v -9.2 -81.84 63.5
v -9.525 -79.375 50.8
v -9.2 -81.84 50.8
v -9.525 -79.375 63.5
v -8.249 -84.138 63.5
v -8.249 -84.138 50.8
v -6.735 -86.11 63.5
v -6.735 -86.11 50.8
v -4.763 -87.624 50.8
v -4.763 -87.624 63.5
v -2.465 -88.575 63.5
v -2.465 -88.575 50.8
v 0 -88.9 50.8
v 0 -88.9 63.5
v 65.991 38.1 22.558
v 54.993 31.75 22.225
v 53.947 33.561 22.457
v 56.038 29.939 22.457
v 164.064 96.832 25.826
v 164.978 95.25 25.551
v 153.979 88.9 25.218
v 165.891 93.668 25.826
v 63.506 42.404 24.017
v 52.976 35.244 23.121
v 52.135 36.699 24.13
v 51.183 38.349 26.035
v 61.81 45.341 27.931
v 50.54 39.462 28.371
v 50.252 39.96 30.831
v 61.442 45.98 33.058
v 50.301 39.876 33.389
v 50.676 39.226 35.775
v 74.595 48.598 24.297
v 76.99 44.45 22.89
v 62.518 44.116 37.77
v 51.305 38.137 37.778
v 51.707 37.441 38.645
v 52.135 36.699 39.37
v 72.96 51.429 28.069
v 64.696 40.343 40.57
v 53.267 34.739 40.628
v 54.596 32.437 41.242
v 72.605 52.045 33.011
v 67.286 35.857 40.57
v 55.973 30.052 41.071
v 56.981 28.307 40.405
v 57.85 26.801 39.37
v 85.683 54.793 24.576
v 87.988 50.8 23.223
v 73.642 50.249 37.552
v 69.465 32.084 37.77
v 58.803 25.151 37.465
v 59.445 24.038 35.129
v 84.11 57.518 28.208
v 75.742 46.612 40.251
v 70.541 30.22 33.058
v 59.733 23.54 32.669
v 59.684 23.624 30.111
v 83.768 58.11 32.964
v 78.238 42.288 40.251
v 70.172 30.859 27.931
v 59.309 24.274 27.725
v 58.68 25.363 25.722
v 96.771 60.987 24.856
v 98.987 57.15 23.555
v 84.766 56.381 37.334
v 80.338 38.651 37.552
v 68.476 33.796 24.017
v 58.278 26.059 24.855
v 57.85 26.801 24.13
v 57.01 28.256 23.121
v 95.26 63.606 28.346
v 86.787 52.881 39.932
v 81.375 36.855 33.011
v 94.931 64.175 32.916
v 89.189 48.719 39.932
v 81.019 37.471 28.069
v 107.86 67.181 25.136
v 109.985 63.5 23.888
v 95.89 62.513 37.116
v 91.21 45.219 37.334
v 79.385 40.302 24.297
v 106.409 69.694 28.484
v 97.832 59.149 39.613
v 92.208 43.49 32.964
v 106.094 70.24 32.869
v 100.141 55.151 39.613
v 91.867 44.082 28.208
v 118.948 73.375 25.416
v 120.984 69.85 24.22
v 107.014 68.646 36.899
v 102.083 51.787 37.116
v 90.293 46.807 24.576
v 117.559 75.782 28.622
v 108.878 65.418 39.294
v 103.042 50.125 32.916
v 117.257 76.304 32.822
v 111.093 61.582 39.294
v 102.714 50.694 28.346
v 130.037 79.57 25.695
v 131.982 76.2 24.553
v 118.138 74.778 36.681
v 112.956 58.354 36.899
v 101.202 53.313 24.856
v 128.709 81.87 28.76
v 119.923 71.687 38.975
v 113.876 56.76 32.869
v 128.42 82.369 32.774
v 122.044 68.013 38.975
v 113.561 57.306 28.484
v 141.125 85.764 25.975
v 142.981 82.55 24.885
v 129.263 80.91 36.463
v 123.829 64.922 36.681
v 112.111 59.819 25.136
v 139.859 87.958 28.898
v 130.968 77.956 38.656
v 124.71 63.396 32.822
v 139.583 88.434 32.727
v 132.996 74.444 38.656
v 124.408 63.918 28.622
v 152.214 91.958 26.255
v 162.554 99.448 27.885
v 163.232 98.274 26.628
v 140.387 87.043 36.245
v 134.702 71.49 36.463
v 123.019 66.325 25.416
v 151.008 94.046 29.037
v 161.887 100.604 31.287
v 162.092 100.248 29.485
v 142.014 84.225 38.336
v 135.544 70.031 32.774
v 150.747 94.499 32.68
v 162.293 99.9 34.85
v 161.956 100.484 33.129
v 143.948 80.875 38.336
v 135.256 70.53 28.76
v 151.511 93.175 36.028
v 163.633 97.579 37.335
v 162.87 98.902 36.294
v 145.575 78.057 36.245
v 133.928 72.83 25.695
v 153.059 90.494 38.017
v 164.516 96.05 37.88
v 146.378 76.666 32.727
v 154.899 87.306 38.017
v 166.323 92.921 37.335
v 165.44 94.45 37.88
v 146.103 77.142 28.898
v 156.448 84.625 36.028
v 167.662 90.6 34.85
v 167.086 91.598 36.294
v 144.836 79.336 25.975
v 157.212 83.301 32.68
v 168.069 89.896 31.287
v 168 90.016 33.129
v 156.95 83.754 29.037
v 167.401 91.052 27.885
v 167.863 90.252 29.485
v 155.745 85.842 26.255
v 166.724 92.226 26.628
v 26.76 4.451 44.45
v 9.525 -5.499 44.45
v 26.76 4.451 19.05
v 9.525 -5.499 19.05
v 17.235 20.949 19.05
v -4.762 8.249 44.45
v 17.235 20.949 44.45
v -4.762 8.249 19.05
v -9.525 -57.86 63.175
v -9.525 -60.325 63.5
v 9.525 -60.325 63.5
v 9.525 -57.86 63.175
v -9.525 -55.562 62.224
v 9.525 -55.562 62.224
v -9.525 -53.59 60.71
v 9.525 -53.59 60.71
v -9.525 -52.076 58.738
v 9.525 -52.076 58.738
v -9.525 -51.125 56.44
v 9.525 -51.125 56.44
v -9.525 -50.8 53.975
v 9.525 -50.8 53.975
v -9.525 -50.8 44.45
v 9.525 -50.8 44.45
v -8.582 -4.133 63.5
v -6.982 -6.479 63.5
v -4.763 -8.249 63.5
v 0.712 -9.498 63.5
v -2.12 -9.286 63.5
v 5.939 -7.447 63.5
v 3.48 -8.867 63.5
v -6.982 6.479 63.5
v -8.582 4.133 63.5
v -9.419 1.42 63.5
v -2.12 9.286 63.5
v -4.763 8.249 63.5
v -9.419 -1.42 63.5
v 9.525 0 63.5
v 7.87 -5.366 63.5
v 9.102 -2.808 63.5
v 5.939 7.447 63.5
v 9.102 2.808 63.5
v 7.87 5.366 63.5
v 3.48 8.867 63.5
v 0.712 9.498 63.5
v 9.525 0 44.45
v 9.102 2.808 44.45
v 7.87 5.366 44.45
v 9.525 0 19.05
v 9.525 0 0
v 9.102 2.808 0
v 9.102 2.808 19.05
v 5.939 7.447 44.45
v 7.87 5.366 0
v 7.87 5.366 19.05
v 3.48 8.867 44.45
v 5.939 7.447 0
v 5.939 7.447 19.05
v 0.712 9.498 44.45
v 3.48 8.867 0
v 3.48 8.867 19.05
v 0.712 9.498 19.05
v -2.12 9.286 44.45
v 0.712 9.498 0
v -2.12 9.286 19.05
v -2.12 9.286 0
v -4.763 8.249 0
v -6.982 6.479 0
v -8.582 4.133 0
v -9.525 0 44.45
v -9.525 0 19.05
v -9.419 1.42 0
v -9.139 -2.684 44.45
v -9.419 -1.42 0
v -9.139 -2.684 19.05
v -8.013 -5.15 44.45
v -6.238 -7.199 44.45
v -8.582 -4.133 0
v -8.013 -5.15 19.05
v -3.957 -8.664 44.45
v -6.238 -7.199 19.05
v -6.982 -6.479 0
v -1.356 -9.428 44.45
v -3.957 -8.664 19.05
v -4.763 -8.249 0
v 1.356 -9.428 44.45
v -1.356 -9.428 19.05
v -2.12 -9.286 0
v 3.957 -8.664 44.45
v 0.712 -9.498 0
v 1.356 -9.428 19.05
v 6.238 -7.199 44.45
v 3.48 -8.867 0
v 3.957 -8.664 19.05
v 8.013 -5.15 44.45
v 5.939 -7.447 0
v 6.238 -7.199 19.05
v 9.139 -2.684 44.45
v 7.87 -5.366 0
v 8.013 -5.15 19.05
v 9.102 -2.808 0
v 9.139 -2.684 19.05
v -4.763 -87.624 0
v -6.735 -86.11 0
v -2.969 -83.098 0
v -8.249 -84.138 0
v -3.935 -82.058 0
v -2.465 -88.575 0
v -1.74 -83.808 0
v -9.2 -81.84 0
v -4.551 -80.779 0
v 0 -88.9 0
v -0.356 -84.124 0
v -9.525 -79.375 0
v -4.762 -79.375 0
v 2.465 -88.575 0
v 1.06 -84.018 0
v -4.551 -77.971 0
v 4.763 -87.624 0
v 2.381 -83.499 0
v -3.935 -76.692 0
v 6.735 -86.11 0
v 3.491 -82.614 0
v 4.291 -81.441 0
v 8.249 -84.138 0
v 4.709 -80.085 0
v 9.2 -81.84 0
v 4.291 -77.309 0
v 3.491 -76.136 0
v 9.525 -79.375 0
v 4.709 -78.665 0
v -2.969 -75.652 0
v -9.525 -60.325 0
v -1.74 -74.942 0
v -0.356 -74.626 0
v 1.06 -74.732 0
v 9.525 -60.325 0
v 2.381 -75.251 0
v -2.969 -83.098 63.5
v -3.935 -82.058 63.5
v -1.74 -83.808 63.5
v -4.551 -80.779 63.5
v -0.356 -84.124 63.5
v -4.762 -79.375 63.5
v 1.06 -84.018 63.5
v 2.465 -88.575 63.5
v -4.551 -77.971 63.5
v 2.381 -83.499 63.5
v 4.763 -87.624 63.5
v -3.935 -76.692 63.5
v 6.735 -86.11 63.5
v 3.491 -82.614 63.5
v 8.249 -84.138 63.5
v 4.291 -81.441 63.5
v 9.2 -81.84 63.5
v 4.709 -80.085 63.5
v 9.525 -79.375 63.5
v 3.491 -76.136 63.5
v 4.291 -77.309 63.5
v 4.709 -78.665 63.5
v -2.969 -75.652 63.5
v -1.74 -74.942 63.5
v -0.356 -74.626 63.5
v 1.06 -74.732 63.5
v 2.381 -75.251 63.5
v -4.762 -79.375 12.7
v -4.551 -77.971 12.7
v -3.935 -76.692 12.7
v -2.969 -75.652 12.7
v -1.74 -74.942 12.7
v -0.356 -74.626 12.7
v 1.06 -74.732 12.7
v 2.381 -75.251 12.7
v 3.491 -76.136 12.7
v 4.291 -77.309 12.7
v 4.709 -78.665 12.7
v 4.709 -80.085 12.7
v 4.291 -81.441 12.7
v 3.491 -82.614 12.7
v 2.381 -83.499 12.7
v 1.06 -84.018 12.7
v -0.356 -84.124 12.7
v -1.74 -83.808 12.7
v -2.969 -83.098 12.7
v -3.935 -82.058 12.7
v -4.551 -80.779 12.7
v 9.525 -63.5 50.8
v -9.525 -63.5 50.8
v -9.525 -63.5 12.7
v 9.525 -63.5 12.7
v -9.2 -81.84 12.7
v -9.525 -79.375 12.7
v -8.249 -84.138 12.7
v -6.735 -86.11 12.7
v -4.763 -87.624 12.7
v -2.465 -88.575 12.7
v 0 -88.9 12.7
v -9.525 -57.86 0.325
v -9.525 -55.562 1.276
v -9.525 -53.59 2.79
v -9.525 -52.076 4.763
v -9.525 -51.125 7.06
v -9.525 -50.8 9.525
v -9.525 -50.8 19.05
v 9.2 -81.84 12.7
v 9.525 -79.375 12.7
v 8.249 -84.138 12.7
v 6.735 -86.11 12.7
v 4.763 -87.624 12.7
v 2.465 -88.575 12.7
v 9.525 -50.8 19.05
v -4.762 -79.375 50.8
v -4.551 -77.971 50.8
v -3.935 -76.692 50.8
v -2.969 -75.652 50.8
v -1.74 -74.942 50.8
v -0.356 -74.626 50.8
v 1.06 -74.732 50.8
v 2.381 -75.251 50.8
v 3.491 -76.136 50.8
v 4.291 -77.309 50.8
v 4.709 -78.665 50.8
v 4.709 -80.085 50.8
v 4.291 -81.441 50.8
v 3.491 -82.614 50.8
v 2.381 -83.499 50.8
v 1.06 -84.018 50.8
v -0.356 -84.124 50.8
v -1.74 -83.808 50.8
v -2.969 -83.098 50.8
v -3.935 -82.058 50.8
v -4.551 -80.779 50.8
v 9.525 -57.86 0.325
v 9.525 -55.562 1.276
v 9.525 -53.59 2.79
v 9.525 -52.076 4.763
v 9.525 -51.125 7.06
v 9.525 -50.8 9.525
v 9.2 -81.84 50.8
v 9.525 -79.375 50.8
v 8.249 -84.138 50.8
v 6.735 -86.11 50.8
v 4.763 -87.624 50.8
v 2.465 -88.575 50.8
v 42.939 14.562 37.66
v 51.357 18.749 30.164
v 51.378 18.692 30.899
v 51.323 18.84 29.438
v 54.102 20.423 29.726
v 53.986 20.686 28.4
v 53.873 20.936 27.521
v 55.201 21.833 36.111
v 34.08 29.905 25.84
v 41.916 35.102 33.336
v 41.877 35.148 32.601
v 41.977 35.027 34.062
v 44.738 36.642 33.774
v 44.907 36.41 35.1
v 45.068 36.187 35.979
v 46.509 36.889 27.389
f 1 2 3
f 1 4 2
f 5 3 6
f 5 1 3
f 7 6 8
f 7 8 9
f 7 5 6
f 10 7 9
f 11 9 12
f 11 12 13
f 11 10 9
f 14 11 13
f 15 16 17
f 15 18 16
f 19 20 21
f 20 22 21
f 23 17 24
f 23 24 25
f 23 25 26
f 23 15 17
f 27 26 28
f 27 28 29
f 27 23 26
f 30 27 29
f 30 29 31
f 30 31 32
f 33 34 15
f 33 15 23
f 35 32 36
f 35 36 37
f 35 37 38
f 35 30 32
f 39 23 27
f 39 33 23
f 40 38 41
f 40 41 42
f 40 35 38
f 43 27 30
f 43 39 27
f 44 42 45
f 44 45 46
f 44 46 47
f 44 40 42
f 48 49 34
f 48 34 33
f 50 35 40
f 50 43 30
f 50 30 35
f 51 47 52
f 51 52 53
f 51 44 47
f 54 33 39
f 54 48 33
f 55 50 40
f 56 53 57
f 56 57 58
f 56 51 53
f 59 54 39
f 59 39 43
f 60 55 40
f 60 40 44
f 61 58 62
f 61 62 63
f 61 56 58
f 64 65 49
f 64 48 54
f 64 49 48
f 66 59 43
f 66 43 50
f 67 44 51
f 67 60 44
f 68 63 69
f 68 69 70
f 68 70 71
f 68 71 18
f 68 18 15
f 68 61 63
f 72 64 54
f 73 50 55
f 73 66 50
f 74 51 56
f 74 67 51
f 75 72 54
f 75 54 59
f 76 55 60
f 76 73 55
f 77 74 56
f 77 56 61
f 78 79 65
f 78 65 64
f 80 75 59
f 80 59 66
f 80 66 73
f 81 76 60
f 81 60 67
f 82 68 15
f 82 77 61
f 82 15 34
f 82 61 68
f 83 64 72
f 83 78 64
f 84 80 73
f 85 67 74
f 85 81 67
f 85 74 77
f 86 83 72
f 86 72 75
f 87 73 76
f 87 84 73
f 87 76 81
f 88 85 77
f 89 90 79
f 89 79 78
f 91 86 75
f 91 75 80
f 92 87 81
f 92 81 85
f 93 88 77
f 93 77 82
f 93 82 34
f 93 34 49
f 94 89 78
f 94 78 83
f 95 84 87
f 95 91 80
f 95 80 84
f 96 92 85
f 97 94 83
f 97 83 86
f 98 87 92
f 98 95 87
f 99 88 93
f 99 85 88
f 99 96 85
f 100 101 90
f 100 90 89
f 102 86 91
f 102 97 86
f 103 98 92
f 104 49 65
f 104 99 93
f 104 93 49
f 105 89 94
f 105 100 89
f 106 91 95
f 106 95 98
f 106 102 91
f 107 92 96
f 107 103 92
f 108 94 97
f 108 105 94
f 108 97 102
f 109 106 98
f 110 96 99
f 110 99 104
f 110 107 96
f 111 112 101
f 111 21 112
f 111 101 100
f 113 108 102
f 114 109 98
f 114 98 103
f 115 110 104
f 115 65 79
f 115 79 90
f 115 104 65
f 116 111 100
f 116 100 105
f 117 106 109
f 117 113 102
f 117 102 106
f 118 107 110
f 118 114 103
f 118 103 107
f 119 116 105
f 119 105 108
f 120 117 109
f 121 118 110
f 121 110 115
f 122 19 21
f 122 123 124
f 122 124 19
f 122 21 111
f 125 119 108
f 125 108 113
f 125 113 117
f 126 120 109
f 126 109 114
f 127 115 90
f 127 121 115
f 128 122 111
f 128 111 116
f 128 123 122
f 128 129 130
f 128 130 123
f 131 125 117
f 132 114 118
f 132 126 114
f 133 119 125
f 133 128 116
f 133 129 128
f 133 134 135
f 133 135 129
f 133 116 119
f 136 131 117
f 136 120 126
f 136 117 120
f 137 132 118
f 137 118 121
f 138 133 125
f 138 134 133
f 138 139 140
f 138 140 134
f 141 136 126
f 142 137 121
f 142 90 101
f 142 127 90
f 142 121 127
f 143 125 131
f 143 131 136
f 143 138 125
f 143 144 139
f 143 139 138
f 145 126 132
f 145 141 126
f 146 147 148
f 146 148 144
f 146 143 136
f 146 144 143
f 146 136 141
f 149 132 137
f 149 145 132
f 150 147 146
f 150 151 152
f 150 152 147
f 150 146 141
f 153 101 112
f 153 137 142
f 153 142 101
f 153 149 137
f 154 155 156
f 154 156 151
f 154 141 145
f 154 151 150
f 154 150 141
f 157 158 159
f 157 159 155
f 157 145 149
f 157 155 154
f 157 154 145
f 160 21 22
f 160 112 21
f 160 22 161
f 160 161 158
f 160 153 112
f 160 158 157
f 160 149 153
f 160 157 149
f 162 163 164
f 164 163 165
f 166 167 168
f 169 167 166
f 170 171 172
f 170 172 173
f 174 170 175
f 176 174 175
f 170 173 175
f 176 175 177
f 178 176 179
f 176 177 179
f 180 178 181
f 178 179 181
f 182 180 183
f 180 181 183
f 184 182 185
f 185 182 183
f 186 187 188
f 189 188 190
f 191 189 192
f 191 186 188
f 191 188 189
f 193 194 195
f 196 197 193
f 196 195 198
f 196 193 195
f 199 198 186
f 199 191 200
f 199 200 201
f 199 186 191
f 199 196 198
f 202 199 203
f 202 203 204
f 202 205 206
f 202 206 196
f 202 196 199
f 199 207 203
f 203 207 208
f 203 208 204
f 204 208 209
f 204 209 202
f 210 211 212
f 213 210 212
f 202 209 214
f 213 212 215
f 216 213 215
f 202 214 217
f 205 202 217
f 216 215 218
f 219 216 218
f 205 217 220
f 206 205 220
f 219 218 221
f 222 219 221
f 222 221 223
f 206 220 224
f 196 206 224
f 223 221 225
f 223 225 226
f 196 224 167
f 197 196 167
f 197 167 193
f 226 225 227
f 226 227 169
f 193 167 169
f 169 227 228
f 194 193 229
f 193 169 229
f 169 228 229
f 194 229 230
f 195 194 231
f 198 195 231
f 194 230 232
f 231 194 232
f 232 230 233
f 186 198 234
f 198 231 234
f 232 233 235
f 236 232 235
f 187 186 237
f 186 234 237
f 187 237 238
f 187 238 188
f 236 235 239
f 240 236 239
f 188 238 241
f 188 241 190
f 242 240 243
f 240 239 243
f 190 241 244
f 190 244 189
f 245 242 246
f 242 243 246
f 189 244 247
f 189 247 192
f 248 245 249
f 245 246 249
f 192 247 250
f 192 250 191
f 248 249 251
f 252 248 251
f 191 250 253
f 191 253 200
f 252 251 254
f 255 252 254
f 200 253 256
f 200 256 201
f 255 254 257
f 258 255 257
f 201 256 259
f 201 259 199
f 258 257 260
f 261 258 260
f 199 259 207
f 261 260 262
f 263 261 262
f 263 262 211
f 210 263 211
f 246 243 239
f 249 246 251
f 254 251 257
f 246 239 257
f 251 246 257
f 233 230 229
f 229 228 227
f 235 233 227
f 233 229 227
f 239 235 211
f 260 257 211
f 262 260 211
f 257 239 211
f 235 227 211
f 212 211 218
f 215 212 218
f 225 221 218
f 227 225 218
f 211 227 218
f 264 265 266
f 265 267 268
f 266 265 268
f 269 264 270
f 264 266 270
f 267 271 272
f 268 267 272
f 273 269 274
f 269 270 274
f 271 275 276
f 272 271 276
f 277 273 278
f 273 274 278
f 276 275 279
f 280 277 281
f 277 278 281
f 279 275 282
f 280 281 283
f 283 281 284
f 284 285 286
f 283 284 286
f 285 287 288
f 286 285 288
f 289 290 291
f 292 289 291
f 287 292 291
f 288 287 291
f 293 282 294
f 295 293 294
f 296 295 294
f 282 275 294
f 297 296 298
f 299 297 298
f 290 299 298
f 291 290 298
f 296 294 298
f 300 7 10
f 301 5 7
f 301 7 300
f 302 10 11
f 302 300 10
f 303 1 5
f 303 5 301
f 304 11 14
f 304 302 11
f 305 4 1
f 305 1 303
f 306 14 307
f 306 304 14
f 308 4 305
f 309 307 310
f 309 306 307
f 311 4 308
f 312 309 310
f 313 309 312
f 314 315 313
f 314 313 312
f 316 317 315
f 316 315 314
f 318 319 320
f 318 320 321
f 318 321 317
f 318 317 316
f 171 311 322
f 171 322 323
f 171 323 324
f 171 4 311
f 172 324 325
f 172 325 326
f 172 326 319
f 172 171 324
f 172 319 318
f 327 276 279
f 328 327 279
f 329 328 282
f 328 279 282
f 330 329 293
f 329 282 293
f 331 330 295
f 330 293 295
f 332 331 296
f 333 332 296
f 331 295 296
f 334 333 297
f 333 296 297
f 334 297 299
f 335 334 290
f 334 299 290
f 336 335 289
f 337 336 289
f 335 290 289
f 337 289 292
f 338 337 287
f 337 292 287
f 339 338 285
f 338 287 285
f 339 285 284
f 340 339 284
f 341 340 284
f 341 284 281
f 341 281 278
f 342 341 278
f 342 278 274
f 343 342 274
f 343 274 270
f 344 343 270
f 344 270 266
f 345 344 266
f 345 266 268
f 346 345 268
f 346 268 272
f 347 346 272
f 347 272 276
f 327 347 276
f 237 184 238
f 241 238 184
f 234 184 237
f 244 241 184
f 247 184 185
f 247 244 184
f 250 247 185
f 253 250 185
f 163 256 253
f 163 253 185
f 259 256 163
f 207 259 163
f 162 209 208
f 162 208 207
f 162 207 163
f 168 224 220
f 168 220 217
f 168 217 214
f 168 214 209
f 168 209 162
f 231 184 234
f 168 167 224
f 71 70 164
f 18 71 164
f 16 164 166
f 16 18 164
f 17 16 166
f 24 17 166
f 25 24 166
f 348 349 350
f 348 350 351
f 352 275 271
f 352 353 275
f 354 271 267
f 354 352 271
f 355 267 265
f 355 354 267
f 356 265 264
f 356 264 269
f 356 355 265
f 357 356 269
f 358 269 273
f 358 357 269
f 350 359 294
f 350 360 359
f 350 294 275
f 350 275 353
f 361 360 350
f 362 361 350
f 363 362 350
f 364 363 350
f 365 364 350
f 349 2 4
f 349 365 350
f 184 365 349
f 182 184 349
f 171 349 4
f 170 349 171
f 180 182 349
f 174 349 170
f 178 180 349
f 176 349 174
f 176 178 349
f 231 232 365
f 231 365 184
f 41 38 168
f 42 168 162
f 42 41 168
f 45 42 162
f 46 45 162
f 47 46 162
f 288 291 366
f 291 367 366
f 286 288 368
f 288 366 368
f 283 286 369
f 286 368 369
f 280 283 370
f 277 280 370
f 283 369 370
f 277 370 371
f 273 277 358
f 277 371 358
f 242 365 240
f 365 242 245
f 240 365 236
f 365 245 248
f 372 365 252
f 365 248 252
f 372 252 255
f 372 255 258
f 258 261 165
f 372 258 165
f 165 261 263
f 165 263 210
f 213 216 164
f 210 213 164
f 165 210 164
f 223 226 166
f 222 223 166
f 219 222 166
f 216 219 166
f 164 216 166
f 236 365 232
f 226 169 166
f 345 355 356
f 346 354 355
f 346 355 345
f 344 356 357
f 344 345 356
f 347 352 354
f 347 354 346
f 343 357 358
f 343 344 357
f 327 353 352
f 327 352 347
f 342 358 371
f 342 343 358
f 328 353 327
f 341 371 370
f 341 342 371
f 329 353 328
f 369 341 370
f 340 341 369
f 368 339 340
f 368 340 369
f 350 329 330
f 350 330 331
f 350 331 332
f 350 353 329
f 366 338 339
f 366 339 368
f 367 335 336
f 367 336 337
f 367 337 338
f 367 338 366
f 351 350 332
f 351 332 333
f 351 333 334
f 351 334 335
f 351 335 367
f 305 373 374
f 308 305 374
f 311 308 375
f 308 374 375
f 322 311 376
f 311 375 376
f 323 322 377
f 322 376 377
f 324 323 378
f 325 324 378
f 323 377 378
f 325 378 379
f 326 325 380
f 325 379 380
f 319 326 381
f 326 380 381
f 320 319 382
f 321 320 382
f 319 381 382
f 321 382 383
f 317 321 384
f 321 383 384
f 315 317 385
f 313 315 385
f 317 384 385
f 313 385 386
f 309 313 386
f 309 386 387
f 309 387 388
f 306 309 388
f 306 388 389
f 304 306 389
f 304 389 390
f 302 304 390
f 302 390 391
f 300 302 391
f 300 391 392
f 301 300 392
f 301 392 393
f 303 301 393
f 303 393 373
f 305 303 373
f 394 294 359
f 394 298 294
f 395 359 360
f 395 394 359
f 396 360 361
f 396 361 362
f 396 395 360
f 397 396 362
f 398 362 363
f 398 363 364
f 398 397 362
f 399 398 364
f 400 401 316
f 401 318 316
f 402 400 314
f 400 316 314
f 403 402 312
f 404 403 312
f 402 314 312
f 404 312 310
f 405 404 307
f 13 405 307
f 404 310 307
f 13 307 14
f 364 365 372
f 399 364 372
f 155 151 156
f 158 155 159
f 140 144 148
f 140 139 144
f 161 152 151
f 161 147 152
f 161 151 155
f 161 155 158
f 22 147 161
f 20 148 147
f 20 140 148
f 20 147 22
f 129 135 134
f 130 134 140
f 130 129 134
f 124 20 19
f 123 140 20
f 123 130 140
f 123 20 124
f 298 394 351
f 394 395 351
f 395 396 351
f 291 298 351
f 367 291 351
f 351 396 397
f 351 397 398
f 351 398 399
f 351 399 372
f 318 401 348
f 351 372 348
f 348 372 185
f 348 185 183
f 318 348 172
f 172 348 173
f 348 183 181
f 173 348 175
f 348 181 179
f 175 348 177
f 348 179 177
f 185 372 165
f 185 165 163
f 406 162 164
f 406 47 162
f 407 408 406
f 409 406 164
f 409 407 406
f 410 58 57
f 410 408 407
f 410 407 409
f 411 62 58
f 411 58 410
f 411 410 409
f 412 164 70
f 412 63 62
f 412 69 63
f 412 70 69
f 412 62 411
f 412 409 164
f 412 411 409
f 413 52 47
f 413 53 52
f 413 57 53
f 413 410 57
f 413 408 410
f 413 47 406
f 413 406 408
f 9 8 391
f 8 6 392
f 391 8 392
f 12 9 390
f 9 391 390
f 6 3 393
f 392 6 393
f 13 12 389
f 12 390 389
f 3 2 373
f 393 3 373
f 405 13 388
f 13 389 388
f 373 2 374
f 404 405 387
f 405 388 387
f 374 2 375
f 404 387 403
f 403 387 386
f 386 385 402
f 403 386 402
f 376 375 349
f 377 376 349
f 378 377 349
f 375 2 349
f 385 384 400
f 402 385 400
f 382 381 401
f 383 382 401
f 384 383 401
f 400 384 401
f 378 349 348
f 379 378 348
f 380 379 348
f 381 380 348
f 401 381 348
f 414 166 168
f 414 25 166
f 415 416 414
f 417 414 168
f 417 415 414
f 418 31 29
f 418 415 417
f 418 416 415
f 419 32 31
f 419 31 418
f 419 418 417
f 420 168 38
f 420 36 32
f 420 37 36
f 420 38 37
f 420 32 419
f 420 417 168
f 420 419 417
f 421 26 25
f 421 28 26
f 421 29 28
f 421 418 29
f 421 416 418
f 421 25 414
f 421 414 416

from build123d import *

# Parameters (mm, degrees)
SKETCH2_R           = 9.525
BOSS_EXTRUDE1_DEPTH = 63.5
SKETCH3_W           = 19.05
SKETCH3_H           = 25.4
BOSS_EXTRUDE2_DEPTH = 50.8
SKETCH4_W           = 25.4
SKETCH4_H           = 19.05
BOSS_EXTRUDE3_DEPTH = 25.4
SKETCH5_2_R         = 9.525
BOSS_EXTRUDE4_DEPTH = 127
BOSS_EXTRUDE4_TAPER = 1.5
SKETCH8_W           = 19.05
SKETCH8_H           = 63.5
BOSS_EXTRUDE5_DEPTH = 12.7
SKETCH9_W           = 19.05
SKETCH9_H           = 12.7
BOSS_EXTRUDE6_DEPTH = 25.4
FILLET2_R           = 9.525
SKETCH12_R          = 4.7625
CUT_EXTRUDE1_DEPTH  = 206.928278116
FILLET3_R           = 9.525


with BuildPart() as part:
    # Sketch2 → Boss-Extrude1 (new body)
    with BuildSketch(Plane.XY):
        Circle(SKETCH2_R)
    extrude(amount=BOSS_EXTRUDE1_DEPTH)

    # Sketch3 → Boss-Extrude2 (add)
    with BuildSketch(Plane(origin=(0, 0, 0), x_dir=(1, 0, 0), z_dir=(0, 1, 0))):
        with Locations((0, -31.75)):
            Rectangle(SKETCH3_W, SKETCH3_H)
    extrude(amount=-BOSS_EXTRUDE2_DEPTH)

    # Sketch4 → Boss-Extrude3 (add)
    with BuildSketch(Plane(origin=(0, 0, 0), x_dir=(0, 0, -1), z_dir=(0.8660254037844398, 0.499999999999998, 0))):
        with Locations((-31.75, 0)):
            Rectangle(SKETCH4_W, SKETCH4_H)
    extrude(amount=BOSS_EXTRUDE3_DEPTH)

    # Sketch6 → Loft1 section 0
    with BuildSketch(Plane(origin=(21.997045256, 12.7, 0), x_dir=(0, 0, -1), z_dir=(0.8660254037844397, 0.4999999999999981, 0))):
        with BuildLine():
            Line((-44.45, 9.525), (-44.45, -9.525))
            Line((-44.45, -9.525), (-19.05, -9.525))
            Line((-19.05, -9.525), (-19.05, 9.525))
            Line((-19.05, 9.525), (-44.45, 9.525))
        make_face()
    # Sketch5 for Loft1 → Loft1 section 1
    with BuildSketch(Plane(origin=(54.99261314, 31.75, 0), x_dir=(0, 0, -1), z_dir=(0.8660254037844397, 0.4999999999999981, 0))):
        with BuildLine():
            # circular arc as an exact rational Bezier (weights 1, cos(half-angle), 1)
            Bezier((-39.37, 5.715), (-43.65625, 0), (-39.37, -5.715), weights=[1, 0.8, 1])
            Bezier((-39.37, -5.715), (-31.75, -15.875), (-24.13, -5.715), weights=[1, 0.6, 1])
            Bezier((-24.13, -5.715), (-19.84375, 0), (-24.13, 5.715), weights=[1, 0.8, 1])
            Bezier((-24.13, 5.715), (-31.75, 15.875), (-39.37, 5.715), weights=[1, 0.6, 1])
        make_face()
    loft()

    # Sketch5<2> → Boss-Extrude4 (add)
    with BuildSketch(Plane(origin=(54.99261314, 31.75, 0), x_dir=(0, 0, -1), z_dir=(0.8660254037844397, 0.4999999999999981, 0))):
        with Locations((-31.75, 0)):
            Circle(SKETCH5_2_R)
    extrude(amount=BOSS_EXTRUDE4_DEPTH, taper=BOSS_EXTRUDE4_TAPER)

    # Sketch8 → Boss-Extrude5 (add)
    with BuildSketch(Plane.XZ.offset(50.8)):
        with Locations((0, 31.75)):
            Rectangle(SKETCH8_W, SKETCH8_H)
    extrude(amount=BOSS_EXTRUDE5_DEPTH)

    # Sketch9 → Boss-Extrude6 (add)
    with BuildSketch(Plane.XZ.offset(63.5)):
        with Locations((0, 57.15)):
            Rectangle(SKETCH9_W, SKETCH9_H)
        with Locations((0, 6.35)):
            Rectangle(SKETCH9_W, SKETCH9_H)
    extrude(amount=BOSS_EXTRUDE6_DEPTH)

    # Fillet2
    fillet2_edges = [part.edges().sort_by_distance(p)[0] for p in [
        (9.525, -88.9, 6.35),
        (9.525, -88.9, 57.15),
        (-9.525, -88.9, 57.15),
        (-9.525, -88.9, 6.35),
    ]]
    fillet(fillet2_edges, radius=FILLET2_R - 0.0001)  # a hair under: the kernel refuses the full size

    # Sketch12 → Cut-Extrude1 (cut, through all)
    with BuildSketch(Plane(origin=(0, 0, 0), x_dir=(-1, 0, 0), z_dir=(0, 0, -1))):
        with Locations((0, -79.375)):
            Circle(SKETCH12_R)
    extrude(amount=-CUT_EXTRUDE1_DEPTH, mode=Mode.SUBTRACT)

    # Fillet3
    fillet3_edges = [part.edges().sort_by_distance(p)[0] for p in [
        (0, -50.8, 0),
        (0, -50.8, 63.5),
    ]]
    fillet(fillet3_edges, radius=FILLET3_R)


solid = part.part
